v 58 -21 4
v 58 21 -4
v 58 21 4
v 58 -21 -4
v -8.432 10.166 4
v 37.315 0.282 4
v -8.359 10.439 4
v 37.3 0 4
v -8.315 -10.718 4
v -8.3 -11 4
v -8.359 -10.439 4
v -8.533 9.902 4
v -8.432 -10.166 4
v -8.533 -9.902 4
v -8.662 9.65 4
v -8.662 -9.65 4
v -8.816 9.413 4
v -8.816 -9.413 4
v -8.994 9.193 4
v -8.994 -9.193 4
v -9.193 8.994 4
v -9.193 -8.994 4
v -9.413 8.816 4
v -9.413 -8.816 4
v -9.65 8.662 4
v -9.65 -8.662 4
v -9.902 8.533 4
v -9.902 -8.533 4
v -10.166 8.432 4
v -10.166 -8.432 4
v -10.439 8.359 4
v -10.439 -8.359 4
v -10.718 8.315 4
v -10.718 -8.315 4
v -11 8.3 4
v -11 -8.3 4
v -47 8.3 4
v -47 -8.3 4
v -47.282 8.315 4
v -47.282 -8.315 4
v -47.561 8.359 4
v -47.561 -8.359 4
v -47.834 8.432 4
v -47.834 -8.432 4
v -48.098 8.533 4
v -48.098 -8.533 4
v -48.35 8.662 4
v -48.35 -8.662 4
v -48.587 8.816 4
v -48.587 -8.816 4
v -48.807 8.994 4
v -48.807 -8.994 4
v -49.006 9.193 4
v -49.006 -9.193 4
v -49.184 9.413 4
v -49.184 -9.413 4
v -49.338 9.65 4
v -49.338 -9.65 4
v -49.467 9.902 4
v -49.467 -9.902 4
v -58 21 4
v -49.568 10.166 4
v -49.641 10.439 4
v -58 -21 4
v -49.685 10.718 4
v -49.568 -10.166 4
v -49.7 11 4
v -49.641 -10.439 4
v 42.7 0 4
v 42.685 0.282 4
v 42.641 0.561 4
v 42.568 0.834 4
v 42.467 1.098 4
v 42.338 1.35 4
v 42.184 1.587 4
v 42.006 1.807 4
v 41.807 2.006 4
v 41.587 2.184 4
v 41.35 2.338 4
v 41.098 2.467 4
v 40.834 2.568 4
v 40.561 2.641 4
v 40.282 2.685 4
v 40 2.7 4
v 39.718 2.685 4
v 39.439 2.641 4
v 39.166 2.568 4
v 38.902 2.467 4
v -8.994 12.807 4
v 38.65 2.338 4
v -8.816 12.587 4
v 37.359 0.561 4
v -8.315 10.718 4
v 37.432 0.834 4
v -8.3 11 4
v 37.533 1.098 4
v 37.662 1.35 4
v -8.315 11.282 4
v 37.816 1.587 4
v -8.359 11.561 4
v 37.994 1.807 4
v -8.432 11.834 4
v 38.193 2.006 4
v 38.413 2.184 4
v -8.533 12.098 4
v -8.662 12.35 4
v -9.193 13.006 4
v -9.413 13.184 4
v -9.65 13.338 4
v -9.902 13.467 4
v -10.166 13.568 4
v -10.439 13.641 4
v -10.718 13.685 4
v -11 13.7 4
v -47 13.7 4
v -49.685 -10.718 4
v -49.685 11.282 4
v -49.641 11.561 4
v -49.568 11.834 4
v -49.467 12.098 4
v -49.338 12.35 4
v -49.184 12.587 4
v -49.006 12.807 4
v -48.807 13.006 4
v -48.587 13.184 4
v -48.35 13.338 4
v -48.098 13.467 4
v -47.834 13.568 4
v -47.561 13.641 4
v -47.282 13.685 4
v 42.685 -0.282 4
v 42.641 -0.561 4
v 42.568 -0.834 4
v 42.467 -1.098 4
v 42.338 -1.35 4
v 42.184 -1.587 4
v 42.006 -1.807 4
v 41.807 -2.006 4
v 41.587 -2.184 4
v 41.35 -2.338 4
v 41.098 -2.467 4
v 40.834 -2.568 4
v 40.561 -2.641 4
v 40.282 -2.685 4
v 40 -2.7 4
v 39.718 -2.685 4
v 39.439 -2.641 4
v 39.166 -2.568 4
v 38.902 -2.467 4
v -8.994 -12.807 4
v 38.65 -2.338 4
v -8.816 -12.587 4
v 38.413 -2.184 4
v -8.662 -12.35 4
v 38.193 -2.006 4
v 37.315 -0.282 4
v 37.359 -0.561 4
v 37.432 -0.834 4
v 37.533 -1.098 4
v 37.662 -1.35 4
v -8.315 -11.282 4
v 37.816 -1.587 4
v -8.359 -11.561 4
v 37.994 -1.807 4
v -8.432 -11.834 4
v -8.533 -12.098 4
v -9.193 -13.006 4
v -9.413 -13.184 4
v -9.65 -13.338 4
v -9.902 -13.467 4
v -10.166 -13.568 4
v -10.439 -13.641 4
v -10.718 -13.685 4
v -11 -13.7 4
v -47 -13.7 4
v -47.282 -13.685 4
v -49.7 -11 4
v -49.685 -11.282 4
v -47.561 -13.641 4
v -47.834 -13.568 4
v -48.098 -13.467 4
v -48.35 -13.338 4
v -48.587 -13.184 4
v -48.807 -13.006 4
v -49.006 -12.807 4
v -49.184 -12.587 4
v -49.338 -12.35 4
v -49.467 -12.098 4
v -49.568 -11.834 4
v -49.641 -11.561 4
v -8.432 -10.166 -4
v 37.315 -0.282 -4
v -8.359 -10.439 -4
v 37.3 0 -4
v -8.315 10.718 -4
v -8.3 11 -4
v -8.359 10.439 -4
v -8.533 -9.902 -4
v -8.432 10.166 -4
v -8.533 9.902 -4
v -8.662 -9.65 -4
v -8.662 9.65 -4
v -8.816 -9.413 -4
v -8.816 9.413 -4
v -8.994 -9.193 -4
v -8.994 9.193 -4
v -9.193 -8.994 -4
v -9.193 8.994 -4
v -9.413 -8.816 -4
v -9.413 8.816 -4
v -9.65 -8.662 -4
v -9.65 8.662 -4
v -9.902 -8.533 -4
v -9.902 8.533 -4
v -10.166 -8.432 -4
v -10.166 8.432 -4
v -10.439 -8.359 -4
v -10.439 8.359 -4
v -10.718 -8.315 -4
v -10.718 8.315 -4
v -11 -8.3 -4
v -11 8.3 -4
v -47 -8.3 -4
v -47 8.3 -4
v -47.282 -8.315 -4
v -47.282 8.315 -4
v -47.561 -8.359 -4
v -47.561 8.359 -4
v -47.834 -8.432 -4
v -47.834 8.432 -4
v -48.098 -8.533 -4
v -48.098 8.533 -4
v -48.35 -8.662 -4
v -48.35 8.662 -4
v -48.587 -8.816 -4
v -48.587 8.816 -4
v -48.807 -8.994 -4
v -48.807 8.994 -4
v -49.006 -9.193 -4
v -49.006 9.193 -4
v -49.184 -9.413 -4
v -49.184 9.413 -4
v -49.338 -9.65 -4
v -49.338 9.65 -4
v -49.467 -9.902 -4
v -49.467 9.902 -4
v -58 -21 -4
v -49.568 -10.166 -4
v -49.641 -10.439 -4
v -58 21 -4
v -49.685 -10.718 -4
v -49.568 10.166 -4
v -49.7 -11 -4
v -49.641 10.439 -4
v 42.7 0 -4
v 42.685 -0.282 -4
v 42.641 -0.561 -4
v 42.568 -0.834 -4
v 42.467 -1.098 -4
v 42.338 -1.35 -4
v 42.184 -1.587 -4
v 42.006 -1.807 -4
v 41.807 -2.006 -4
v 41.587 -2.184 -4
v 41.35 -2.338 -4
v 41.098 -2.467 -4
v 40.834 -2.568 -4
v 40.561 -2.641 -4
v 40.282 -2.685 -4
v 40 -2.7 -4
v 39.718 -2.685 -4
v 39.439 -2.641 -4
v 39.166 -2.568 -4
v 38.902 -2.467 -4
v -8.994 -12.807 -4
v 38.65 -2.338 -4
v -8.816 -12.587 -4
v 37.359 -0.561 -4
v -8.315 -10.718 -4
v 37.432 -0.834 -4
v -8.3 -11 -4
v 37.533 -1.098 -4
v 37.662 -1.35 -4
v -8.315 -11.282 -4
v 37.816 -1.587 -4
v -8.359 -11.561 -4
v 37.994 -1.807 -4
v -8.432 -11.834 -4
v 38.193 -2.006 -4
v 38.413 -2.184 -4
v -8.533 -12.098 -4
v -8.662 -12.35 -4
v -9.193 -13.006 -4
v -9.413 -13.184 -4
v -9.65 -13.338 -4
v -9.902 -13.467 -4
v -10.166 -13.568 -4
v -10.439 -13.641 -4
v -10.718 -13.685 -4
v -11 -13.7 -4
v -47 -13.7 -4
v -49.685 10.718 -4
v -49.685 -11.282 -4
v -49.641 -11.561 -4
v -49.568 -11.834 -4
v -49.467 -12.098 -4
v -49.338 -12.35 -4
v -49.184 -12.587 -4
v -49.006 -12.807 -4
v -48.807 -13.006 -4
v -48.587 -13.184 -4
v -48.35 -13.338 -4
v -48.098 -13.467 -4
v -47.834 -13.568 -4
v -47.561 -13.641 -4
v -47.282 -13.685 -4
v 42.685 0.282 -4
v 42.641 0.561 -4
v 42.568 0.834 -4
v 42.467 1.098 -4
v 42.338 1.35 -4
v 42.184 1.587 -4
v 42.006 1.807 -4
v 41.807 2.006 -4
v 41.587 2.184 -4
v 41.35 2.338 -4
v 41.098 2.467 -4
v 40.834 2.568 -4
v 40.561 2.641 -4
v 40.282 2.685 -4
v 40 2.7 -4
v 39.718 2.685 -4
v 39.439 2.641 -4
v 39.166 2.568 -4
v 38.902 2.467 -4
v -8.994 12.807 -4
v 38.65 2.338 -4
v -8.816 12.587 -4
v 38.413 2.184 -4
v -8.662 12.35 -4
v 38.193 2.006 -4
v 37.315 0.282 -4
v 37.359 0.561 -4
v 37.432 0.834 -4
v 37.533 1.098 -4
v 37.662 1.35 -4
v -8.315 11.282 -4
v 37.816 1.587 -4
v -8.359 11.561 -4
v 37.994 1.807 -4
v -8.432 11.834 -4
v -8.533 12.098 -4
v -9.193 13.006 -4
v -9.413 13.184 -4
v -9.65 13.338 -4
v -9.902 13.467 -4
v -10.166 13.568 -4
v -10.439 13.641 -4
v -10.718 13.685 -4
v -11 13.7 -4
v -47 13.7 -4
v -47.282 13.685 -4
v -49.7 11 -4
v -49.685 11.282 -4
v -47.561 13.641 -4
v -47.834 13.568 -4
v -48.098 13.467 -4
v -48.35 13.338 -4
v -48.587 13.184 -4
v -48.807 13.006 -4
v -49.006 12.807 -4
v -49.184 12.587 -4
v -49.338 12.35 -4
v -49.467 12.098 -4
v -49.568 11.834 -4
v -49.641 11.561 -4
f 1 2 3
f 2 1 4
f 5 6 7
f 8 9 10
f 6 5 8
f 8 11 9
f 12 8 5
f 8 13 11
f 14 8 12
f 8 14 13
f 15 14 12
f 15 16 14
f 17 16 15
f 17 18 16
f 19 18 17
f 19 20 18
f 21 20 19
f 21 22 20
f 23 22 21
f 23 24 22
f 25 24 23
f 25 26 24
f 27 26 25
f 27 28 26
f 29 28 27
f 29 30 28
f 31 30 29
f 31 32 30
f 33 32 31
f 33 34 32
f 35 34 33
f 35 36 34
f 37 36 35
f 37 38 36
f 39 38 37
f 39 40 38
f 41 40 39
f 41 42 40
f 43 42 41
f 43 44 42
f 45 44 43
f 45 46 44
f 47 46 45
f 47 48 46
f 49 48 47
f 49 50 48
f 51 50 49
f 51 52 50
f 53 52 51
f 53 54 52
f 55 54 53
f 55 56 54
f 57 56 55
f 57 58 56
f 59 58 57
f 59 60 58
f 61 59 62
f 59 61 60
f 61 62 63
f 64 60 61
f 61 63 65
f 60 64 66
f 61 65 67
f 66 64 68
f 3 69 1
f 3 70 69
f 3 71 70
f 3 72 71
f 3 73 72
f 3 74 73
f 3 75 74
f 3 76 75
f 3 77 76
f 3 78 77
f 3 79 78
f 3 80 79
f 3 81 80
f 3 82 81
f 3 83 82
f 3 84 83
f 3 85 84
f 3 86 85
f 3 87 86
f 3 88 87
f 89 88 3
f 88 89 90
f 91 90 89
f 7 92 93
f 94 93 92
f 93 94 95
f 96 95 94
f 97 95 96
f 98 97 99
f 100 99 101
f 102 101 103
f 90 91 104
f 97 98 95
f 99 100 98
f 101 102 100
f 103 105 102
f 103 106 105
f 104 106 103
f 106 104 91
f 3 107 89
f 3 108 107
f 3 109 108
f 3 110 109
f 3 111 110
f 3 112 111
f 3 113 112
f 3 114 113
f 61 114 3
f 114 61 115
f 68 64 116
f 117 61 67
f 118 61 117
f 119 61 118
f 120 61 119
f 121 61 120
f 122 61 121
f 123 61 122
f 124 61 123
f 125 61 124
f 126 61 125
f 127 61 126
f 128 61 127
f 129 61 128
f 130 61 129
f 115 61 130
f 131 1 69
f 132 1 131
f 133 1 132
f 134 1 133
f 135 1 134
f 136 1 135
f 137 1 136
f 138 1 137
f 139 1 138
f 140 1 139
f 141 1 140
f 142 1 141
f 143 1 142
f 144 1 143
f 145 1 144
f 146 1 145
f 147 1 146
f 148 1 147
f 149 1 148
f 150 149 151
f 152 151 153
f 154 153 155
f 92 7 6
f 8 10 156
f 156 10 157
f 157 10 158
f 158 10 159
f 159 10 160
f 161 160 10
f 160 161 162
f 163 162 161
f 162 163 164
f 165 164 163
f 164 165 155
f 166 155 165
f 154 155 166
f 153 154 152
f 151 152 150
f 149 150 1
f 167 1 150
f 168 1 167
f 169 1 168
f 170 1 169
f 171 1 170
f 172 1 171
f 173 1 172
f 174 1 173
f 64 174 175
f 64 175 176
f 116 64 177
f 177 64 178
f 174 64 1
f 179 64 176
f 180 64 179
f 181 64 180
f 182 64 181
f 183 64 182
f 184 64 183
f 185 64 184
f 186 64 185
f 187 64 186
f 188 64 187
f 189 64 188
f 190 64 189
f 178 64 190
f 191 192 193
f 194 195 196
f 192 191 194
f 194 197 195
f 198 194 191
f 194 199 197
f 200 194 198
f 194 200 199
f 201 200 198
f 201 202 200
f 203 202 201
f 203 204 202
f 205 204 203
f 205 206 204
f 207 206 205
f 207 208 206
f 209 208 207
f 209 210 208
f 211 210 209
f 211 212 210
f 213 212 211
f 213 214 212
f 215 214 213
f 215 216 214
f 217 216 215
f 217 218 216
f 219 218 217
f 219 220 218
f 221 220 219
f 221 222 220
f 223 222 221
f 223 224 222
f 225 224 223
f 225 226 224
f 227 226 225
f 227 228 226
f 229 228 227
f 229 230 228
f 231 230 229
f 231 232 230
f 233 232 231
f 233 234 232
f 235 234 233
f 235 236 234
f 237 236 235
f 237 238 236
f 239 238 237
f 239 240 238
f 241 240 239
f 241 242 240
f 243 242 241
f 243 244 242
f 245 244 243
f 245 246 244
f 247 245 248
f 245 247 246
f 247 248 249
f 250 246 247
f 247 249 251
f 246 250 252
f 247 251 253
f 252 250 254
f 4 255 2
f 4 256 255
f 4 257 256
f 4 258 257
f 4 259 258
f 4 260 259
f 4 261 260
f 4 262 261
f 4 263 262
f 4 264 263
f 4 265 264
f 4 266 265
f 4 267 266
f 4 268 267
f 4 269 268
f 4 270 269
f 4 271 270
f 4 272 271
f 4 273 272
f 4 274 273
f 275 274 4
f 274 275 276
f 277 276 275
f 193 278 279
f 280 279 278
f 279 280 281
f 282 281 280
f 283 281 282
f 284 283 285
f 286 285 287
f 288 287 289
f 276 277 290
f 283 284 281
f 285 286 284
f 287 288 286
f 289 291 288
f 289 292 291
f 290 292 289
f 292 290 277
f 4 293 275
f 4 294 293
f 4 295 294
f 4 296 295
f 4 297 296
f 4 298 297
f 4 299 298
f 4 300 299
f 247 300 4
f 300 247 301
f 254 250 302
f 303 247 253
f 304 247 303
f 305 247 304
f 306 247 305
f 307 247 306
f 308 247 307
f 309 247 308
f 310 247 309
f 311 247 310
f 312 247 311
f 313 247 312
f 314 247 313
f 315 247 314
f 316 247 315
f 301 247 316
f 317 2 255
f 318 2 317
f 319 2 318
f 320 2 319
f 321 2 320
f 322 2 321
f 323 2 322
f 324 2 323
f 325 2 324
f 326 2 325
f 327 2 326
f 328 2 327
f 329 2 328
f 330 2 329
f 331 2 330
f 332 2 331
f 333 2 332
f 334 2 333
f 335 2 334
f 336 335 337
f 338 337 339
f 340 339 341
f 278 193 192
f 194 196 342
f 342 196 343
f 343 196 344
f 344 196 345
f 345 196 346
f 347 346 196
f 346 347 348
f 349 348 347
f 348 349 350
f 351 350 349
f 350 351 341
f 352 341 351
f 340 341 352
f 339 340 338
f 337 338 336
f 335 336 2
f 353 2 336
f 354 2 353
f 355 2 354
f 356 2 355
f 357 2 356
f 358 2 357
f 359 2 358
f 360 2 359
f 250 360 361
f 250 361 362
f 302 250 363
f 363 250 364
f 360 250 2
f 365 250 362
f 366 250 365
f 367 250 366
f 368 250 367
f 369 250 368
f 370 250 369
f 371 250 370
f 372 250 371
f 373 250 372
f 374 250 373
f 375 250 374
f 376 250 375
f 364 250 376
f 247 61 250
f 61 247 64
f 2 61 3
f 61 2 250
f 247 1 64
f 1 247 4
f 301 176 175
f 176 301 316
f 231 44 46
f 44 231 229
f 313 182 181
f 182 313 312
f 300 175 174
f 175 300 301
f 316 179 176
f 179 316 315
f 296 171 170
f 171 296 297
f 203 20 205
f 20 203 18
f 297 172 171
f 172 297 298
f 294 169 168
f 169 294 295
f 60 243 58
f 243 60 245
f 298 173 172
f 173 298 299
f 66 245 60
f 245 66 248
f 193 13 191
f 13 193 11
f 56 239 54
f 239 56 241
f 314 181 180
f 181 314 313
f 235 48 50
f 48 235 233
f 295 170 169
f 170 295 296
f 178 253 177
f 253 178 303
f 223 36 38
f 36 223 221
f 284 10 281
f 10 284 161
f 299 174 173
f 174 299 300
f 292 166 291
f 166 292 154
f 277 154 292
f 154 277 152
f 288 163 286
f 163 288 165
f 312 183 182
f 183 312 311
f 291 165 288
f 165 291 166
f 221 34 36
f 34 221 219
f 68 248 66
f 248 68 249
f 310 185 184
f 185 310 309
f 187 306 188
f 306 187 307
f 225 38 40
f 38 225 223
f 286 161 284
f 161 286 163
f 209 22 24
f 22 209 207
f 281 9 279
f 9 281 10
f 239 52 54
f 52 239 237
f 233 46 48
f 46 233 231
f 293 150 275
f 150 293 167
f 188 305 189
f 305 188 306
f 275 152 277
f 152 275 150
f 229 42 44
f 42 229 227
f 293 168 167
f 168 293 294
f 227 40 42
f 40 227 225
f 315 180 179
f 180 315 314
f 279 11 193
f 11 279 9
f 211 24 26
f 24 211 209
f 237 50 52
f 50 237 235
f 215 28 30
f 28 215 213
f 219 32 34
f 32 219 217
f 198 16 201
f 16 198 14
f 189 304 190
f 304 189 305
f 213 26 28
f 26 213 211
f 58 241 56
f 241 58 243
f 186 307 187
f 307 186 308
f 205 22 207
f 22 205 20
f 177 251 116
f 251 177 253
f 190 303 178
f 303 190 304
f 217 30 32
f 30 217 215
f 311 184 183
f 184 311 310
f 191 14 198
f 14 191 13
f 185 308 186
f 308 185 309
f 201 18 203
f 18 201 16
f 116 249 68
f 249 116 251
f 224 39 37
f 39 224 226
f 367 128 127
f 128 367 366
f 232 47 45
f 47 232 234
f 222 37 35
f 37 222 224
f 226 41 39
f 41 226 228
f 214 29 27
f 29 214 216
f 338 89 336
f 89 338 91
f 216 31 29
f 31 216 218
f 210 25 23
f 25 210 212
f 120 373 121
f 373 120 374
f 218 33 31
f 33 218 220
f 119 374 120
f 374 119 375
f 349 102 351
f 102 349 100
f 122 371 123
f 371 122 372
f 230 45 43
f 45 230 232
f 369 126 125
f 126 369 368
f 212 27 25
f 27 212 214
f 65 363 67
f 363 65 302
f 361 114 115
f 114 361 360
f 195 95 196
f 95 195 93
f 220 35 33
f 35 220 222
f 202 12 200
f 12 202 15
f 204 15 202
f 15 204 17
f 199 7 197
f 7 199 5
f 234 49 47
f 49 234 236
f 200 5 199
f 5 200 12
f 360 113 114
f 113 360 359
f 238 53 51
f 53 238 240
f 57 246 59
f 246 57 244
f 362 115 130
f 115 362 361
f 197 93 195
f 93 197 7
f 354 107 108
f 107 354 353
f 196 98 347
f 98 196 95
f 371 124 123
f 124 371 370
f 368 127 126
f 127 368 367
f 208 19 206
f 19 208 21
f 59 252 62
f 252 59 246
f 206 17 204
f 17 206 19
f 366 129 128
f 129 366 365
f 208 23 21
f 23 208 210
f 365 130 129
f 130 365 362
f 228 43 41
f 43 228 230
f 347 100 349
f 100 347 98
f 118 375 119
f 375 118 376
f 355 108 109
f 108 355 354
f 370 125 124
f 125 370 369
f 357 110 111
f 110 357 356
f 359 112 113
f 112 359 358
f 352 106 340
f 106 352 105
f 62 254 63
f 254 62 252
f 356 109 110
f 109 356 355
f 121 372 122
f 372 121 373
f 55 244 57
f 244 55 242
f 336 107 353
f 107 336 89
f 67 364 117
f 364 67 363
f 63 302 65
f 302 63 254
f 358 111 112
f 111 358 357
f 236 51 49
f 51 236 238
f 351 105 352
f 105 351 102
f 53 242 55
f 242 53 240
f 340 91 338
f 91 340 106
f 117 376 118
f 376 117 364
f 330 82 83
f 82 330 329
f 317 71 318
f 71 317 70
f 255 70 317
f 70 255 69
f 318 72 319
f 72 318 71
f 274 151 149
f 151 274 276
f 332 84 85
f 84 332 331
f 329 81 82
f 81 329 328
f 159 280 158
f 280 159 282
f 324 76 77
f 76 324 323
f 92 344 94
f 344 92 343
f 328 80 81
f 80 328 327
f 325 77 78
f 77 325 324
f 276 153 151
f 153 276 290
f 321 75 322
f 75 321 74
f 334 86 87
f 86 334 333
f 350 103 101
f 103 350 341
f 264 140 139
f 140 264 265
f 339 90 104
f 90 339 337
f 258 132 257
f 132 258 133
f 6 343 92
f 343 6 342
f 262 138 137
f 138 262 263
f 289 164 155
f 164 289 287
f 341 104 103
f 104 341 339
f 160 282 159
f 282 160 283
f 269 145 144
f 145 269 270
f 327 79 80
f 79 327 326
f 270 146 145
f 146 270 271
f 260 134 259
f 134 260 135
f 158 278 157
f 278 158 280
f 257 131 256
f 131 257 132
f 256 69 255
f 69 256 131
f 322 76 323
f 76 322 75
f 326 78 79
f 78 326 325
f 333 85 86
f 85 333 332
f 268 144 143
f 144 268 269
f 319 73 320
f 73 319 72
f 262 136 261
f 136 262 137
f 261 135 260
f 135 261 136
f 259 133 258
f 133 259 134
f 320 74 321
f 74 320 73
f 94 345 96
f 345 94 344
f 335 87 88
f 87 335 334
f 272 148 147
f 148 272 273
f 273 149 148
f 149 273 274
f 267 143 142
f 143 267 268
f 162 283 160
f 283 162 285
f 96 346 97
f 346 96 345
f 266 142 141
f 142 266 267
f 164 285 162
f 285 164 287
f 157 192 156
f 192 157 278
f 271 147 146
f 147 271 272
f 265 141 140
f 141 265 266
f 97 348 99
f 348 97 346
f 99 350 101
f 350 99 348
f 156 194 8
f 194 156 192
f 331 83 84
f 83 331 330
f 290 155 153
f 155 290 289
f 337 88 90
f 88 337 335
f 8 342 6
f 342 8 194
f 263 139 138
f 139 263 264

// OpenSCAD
// GT2 idler tensioner slide for 20 mm belt.
$fn = 60;
eps = 0.02;
slide_l = 116;
slide_w = 42;
slide_t = 8;
belt_w = 20;
slot_l = 36;
axle_d = 5.4;
axle_x = slide_l / 2 - 18;
module slot(y) {
    hull() {
        translate([-slide_l / 4 - slot_l / 2, y, -slide_t / 2 - eps]) cylinder(d = 5.4, h = slide_t + 2 * eps);
        translate([-slide_l / 4 + slot_l / 2, y, -slide_t / 2 - eps]) cylinder(d = 5.4, h = slide_t + 2 * eps);
    }
}
difference() {
    cube([slide_l, slide_w, slide_t], center = true);
    slot(-11);
    slot(11);
    translate([axle_x, 0, -slide_t / 2 - eps]) cylinder(d = axle_d, h = slide_t + 2 * eps);
}
